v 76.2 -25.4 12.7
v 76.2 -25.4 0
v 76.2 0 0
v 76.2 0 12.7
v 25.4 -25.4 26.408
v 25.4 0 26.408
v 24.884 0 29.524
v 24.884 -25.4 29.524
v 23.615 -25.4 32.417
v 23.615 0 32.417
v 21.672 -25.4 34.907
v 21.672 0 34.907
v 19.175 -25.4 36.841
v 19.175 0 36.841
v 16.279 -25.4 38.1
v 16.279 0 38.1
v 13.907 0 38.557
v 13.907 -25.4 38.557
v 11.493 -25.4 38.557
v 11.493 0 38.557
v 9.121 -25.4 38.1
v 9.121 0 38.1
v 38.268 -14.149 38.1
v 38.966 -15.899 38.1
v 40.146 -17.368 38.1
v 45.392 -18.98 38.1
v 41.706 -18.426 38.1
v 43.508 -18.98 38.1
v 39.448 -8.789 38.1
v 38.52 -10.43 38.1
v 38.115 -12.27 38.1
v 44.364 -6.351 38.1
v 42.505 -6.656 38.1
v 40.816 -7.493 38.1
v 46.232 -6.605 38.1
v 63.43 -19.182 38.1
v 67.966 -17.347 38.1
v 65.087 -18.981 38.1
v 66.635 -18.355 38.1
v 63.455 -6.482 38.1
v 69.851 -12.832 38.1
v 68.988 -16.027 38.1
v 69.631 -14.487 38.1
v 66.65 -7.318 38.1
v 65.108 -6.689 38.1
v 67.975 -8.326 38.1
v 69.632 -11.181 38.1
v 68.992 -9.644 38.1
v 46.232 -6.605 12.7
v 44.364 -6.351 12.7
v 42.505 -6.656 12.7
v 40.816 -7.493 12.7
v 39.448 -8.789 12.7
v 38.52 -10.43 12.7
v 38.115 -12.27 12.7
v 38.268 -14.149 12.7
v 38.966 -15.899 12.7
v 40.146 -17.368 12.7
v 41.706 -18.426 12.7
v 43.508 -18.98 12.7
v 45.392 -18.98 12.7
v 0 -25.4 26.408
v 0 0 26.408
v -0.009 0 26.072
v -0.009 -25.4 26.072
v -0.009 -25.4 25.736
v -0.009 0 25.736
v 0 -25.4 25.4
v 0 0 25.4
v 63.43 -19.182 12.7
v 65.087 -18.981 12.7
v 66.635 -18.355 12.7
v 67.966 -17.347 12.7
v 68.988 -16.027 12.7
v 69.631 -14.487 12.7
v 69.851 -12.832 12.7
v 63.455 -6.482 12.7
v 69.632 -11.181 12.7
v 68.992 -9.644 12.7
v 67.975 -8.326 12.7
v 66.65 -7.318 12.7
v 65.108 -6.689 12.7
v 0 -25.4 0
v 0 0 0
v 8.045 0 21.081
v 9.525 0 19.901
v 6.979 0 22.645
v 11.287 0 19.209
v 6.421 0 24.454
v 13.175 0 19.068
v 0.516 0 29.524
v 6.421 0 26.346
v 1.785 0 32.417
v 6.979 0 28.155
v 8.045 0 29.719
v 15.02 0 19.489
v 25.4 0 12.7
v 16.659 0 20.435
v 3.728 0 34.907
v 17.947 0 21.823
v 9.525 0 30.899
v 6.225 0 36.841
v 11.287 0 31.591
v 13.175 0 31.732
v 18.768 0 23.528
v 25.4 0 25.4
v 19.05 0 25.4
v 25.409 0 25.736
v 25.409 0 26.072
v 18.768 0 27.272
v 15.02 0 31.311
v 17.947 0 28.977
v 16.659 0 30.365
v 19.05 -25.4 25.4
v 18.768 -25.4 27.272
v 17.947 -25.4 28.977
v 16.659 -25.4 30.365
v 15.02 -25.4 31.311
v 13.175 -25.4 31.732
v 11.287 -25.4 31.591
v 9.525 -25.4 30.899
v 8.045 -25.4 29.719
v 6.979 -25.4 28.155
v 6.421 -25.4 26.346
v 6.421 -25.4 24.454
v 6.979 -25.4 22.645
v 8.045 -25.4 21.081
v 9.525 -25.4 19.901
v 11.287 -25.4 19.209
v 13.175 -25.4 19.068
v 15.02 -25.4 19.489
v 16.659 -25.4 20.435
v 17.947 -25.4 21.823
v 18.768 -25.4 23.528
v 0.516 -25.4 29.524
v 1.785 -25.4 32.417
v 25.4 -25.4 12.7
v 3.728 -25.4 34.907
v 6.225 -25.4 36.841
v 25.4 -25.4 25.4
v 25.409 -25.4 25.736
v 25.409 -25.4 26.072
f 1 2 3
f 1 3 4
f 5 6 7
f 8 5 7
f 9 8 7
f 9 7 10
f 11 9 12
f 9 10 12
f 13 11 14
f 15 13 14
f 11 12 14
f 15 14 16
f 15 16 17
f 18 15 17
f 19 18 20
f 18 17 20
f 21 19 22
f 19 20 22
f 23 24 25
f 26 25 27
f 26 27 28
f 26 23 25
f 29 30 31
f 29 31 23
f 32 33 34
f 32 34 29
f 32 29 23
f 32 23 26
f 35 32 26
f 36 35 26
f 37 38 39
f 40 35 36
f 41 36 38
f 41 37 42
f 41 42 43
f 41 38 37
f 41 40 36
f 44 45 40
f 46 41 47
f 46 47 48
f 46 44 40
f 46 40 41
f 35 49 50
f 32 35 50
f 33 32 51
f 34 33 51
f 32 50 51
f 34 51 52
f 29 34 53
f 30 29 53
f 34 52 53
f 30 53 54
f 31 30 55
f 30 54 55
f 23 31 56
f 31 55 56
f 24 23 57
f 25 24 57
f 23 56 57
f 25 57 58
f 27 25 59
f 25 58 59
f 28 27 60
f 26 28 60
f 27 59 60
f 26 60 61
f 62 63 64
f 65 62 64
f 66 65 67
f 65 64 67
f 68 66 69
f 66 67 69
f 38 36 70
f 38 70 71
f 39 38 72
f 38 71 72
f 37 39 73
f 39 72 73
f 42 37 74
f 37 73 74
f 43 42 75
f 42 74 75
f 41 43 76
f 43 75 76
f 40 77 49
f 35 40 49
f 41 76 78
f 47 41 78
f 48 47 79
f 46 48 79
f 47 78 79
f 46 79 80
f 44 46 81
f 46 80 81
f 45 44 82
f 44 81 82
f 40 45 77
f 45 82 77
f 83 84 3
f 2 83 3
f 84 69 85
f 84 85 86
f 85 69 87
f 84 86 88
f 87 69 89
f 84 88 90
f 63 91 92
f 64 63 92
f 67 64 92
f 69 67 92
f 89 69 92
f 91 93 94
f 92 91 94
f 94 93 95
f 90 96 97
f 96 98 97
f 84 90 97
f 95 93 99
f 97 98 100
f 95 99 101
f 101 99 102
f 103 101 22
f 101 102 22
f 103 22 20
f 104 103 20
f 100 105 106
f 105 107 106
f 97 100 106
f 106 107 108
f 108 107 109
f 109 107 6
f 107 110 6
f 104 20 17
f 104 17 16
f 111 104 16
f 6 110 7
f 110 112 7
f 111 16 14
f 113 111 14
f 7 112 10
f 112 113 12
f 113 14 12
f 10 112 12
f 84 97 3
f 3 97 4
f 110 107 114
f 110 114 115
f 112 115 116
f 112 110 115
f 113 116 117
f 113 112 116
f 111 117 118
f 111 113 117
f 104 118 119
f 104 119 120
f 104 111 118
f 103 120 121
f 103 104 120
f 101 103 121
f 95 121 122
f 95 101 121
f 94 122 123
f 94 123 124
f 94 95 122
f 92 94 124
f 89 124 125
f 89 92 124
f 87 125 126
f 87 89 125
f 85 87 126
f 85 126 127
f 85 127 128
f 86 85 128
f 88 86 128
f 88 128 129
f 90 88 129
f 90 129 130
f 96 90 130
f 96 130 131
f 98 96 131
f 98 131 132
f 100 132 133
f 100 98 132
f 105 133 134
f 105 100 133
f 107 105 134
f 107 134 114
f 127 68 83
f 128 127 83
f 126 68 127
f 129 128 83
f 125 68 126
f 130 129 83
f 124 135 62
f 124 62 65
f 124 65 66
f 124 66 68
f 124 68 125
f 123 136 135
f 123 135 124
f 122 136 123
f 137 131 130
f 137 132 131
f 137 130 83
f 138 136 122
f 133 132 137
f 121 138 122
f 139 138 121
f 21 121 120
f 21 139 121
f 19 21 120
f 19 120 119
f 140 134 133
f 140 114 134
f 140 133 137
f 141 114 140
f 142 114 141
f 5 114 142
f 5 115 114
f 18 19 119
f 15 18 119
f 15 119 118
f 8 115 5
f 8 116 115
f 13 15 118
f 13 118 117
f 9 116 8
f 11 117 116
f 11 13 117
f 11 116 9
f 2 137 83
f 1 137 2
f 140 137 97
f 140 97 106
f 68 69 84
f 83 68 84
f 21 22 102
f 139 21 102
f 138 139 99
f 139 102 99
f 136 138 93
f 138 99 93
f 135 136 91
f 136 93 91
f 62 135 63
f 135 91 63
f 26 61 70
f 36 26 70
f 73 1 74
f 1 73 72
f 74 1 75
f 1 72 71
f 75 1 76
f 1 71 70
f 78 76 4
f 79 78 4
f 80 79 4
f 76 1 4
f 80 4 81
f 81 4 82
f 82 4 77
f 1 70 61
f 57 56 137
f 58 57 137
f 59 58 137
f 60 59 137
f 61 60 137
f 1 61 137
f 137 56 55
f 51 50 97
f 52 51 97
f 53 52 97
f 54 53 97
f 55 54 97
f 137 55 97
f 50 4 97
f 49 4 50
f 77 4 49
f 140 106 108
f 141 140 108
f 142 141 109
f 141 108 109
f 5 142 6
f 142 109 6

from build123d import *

# Parameters (mm, degrees)
F0_R     = 6.35
F1_DEPTH = 25.4
F3_DEPTH = 25.4


with BuildPart() as f1:
    # F0 (on Front) → F1 (new body)
    with BuildSketch(Plane.XZ):
        with BuildLine():
            Line((0, 25.4), (0, 0))
            Line((0, 0), (76.2, 0))
            Line((76.2, 0), (76.2, 12.7))
            Line((76.2, 12.7), (25.4, 12.7))
            Line((25.4, 12.7), (25.4, 25.4))
            Line((25.4, 25.4), (25.4, 26.4084818092))
            ThreePointArc((25.4, 26.4084818092), (22.7211091646, 33.7222732658), (16.2787873612, 38.1))
            Line((16.2787873612, 38.1), (9.1212126388, 38.1))
            ThreePointArc((9.1212126388, 38.1), (2.6788908354, 33.7222732658), (0, 26.4084818092))
            Line((0, 26.4084818092), (0, 25.4))
        make_face()
        with Locations((12.7, 25.4)):
            Circle(F0_R, mode=Mode.SUBTRACT)
        with BuildLine():
            ThreePointArc((0, 26.4084818092), (-0.0100062506, 25.9042409046), (0, 25.4))
            Line((0, 25.4), (0, 26.4084818092))
        make_face()
        with BuildLine():
            ThreePointArc((16.2787873612, 38.1), (12.7, 38.6142471552), (9.1212126388, 38.1))
            Line((9.1212126388, 38.1), (16.2787873612, 38.1))
        make_face()
        with BuildLine():
            Line((25.4, 26.4084818092), (25.4, 25.4))
            ThreePointArc((25.4, 25.4), (25.4100062506, 25.9042409046), (25.4, 26.4084818092))
        make_face()
    extrude(amount=F1_DEPTH)

    # F2 (on face) → F3 (join)
    with BuildSketch(Plane.XY.offset(12.7)):
        with BuildLine():
            ThreePointArc((45.3922208286, -18.9798098827), (49.2621954374, -16.8438963443), (50.8006859977, -12.7))
            ThreePointArc((50.8006859977, -12.7), (49.5316727855, -8.8913160721), (46.2318440252, -6.6049219791))
            ThreePointArc((46.2318440252, -6.6049219791), (38.1152517777, -12.2701474168), (45.3922208286, -18.9798098827))
        make_face()
        with BuildLine():
            ThreePointArc((69.8506859977, -12.8319995129), (67.9747841458, -8.325898564), (63.4554274902, -6.482160801))
            ThreePointArc((63.4554274902, -6.482160801), (57.1506990788, -12.8191103921), (63.4296503294, -19.1816021724))
            ThreePointArc((63.4296503294, -19.1816021724), (67.9656285229, -17.3471726266), (69.8506859977, -12.8319995129))
        make_face()
        with BuildLine():
            ThreePointArc((46.2318440252, -6.6049219791), (49.5316727855, -8.8913160721), (50.8006859977, -12.7))
            ThreePointArc((50.8006859977, -12.7), (49.2621954374, -16.8438963443), (45.3922208286, -18.9798098827))
            Line((45.3922208286, -18.9798098827), (63.4296503294, -19.1816021724))
            ThreePointArc((63.4296503294, -19.1816021724), (57.1506990788, -12.8191103921), (63.4554274902, -6.482160801))
            Line((63.4554274902, -6.482160801), (46.2318440252, -6.6049219791))
        make_face()
    extrude(amount=F3_DEPTH)


solid = f1.part
